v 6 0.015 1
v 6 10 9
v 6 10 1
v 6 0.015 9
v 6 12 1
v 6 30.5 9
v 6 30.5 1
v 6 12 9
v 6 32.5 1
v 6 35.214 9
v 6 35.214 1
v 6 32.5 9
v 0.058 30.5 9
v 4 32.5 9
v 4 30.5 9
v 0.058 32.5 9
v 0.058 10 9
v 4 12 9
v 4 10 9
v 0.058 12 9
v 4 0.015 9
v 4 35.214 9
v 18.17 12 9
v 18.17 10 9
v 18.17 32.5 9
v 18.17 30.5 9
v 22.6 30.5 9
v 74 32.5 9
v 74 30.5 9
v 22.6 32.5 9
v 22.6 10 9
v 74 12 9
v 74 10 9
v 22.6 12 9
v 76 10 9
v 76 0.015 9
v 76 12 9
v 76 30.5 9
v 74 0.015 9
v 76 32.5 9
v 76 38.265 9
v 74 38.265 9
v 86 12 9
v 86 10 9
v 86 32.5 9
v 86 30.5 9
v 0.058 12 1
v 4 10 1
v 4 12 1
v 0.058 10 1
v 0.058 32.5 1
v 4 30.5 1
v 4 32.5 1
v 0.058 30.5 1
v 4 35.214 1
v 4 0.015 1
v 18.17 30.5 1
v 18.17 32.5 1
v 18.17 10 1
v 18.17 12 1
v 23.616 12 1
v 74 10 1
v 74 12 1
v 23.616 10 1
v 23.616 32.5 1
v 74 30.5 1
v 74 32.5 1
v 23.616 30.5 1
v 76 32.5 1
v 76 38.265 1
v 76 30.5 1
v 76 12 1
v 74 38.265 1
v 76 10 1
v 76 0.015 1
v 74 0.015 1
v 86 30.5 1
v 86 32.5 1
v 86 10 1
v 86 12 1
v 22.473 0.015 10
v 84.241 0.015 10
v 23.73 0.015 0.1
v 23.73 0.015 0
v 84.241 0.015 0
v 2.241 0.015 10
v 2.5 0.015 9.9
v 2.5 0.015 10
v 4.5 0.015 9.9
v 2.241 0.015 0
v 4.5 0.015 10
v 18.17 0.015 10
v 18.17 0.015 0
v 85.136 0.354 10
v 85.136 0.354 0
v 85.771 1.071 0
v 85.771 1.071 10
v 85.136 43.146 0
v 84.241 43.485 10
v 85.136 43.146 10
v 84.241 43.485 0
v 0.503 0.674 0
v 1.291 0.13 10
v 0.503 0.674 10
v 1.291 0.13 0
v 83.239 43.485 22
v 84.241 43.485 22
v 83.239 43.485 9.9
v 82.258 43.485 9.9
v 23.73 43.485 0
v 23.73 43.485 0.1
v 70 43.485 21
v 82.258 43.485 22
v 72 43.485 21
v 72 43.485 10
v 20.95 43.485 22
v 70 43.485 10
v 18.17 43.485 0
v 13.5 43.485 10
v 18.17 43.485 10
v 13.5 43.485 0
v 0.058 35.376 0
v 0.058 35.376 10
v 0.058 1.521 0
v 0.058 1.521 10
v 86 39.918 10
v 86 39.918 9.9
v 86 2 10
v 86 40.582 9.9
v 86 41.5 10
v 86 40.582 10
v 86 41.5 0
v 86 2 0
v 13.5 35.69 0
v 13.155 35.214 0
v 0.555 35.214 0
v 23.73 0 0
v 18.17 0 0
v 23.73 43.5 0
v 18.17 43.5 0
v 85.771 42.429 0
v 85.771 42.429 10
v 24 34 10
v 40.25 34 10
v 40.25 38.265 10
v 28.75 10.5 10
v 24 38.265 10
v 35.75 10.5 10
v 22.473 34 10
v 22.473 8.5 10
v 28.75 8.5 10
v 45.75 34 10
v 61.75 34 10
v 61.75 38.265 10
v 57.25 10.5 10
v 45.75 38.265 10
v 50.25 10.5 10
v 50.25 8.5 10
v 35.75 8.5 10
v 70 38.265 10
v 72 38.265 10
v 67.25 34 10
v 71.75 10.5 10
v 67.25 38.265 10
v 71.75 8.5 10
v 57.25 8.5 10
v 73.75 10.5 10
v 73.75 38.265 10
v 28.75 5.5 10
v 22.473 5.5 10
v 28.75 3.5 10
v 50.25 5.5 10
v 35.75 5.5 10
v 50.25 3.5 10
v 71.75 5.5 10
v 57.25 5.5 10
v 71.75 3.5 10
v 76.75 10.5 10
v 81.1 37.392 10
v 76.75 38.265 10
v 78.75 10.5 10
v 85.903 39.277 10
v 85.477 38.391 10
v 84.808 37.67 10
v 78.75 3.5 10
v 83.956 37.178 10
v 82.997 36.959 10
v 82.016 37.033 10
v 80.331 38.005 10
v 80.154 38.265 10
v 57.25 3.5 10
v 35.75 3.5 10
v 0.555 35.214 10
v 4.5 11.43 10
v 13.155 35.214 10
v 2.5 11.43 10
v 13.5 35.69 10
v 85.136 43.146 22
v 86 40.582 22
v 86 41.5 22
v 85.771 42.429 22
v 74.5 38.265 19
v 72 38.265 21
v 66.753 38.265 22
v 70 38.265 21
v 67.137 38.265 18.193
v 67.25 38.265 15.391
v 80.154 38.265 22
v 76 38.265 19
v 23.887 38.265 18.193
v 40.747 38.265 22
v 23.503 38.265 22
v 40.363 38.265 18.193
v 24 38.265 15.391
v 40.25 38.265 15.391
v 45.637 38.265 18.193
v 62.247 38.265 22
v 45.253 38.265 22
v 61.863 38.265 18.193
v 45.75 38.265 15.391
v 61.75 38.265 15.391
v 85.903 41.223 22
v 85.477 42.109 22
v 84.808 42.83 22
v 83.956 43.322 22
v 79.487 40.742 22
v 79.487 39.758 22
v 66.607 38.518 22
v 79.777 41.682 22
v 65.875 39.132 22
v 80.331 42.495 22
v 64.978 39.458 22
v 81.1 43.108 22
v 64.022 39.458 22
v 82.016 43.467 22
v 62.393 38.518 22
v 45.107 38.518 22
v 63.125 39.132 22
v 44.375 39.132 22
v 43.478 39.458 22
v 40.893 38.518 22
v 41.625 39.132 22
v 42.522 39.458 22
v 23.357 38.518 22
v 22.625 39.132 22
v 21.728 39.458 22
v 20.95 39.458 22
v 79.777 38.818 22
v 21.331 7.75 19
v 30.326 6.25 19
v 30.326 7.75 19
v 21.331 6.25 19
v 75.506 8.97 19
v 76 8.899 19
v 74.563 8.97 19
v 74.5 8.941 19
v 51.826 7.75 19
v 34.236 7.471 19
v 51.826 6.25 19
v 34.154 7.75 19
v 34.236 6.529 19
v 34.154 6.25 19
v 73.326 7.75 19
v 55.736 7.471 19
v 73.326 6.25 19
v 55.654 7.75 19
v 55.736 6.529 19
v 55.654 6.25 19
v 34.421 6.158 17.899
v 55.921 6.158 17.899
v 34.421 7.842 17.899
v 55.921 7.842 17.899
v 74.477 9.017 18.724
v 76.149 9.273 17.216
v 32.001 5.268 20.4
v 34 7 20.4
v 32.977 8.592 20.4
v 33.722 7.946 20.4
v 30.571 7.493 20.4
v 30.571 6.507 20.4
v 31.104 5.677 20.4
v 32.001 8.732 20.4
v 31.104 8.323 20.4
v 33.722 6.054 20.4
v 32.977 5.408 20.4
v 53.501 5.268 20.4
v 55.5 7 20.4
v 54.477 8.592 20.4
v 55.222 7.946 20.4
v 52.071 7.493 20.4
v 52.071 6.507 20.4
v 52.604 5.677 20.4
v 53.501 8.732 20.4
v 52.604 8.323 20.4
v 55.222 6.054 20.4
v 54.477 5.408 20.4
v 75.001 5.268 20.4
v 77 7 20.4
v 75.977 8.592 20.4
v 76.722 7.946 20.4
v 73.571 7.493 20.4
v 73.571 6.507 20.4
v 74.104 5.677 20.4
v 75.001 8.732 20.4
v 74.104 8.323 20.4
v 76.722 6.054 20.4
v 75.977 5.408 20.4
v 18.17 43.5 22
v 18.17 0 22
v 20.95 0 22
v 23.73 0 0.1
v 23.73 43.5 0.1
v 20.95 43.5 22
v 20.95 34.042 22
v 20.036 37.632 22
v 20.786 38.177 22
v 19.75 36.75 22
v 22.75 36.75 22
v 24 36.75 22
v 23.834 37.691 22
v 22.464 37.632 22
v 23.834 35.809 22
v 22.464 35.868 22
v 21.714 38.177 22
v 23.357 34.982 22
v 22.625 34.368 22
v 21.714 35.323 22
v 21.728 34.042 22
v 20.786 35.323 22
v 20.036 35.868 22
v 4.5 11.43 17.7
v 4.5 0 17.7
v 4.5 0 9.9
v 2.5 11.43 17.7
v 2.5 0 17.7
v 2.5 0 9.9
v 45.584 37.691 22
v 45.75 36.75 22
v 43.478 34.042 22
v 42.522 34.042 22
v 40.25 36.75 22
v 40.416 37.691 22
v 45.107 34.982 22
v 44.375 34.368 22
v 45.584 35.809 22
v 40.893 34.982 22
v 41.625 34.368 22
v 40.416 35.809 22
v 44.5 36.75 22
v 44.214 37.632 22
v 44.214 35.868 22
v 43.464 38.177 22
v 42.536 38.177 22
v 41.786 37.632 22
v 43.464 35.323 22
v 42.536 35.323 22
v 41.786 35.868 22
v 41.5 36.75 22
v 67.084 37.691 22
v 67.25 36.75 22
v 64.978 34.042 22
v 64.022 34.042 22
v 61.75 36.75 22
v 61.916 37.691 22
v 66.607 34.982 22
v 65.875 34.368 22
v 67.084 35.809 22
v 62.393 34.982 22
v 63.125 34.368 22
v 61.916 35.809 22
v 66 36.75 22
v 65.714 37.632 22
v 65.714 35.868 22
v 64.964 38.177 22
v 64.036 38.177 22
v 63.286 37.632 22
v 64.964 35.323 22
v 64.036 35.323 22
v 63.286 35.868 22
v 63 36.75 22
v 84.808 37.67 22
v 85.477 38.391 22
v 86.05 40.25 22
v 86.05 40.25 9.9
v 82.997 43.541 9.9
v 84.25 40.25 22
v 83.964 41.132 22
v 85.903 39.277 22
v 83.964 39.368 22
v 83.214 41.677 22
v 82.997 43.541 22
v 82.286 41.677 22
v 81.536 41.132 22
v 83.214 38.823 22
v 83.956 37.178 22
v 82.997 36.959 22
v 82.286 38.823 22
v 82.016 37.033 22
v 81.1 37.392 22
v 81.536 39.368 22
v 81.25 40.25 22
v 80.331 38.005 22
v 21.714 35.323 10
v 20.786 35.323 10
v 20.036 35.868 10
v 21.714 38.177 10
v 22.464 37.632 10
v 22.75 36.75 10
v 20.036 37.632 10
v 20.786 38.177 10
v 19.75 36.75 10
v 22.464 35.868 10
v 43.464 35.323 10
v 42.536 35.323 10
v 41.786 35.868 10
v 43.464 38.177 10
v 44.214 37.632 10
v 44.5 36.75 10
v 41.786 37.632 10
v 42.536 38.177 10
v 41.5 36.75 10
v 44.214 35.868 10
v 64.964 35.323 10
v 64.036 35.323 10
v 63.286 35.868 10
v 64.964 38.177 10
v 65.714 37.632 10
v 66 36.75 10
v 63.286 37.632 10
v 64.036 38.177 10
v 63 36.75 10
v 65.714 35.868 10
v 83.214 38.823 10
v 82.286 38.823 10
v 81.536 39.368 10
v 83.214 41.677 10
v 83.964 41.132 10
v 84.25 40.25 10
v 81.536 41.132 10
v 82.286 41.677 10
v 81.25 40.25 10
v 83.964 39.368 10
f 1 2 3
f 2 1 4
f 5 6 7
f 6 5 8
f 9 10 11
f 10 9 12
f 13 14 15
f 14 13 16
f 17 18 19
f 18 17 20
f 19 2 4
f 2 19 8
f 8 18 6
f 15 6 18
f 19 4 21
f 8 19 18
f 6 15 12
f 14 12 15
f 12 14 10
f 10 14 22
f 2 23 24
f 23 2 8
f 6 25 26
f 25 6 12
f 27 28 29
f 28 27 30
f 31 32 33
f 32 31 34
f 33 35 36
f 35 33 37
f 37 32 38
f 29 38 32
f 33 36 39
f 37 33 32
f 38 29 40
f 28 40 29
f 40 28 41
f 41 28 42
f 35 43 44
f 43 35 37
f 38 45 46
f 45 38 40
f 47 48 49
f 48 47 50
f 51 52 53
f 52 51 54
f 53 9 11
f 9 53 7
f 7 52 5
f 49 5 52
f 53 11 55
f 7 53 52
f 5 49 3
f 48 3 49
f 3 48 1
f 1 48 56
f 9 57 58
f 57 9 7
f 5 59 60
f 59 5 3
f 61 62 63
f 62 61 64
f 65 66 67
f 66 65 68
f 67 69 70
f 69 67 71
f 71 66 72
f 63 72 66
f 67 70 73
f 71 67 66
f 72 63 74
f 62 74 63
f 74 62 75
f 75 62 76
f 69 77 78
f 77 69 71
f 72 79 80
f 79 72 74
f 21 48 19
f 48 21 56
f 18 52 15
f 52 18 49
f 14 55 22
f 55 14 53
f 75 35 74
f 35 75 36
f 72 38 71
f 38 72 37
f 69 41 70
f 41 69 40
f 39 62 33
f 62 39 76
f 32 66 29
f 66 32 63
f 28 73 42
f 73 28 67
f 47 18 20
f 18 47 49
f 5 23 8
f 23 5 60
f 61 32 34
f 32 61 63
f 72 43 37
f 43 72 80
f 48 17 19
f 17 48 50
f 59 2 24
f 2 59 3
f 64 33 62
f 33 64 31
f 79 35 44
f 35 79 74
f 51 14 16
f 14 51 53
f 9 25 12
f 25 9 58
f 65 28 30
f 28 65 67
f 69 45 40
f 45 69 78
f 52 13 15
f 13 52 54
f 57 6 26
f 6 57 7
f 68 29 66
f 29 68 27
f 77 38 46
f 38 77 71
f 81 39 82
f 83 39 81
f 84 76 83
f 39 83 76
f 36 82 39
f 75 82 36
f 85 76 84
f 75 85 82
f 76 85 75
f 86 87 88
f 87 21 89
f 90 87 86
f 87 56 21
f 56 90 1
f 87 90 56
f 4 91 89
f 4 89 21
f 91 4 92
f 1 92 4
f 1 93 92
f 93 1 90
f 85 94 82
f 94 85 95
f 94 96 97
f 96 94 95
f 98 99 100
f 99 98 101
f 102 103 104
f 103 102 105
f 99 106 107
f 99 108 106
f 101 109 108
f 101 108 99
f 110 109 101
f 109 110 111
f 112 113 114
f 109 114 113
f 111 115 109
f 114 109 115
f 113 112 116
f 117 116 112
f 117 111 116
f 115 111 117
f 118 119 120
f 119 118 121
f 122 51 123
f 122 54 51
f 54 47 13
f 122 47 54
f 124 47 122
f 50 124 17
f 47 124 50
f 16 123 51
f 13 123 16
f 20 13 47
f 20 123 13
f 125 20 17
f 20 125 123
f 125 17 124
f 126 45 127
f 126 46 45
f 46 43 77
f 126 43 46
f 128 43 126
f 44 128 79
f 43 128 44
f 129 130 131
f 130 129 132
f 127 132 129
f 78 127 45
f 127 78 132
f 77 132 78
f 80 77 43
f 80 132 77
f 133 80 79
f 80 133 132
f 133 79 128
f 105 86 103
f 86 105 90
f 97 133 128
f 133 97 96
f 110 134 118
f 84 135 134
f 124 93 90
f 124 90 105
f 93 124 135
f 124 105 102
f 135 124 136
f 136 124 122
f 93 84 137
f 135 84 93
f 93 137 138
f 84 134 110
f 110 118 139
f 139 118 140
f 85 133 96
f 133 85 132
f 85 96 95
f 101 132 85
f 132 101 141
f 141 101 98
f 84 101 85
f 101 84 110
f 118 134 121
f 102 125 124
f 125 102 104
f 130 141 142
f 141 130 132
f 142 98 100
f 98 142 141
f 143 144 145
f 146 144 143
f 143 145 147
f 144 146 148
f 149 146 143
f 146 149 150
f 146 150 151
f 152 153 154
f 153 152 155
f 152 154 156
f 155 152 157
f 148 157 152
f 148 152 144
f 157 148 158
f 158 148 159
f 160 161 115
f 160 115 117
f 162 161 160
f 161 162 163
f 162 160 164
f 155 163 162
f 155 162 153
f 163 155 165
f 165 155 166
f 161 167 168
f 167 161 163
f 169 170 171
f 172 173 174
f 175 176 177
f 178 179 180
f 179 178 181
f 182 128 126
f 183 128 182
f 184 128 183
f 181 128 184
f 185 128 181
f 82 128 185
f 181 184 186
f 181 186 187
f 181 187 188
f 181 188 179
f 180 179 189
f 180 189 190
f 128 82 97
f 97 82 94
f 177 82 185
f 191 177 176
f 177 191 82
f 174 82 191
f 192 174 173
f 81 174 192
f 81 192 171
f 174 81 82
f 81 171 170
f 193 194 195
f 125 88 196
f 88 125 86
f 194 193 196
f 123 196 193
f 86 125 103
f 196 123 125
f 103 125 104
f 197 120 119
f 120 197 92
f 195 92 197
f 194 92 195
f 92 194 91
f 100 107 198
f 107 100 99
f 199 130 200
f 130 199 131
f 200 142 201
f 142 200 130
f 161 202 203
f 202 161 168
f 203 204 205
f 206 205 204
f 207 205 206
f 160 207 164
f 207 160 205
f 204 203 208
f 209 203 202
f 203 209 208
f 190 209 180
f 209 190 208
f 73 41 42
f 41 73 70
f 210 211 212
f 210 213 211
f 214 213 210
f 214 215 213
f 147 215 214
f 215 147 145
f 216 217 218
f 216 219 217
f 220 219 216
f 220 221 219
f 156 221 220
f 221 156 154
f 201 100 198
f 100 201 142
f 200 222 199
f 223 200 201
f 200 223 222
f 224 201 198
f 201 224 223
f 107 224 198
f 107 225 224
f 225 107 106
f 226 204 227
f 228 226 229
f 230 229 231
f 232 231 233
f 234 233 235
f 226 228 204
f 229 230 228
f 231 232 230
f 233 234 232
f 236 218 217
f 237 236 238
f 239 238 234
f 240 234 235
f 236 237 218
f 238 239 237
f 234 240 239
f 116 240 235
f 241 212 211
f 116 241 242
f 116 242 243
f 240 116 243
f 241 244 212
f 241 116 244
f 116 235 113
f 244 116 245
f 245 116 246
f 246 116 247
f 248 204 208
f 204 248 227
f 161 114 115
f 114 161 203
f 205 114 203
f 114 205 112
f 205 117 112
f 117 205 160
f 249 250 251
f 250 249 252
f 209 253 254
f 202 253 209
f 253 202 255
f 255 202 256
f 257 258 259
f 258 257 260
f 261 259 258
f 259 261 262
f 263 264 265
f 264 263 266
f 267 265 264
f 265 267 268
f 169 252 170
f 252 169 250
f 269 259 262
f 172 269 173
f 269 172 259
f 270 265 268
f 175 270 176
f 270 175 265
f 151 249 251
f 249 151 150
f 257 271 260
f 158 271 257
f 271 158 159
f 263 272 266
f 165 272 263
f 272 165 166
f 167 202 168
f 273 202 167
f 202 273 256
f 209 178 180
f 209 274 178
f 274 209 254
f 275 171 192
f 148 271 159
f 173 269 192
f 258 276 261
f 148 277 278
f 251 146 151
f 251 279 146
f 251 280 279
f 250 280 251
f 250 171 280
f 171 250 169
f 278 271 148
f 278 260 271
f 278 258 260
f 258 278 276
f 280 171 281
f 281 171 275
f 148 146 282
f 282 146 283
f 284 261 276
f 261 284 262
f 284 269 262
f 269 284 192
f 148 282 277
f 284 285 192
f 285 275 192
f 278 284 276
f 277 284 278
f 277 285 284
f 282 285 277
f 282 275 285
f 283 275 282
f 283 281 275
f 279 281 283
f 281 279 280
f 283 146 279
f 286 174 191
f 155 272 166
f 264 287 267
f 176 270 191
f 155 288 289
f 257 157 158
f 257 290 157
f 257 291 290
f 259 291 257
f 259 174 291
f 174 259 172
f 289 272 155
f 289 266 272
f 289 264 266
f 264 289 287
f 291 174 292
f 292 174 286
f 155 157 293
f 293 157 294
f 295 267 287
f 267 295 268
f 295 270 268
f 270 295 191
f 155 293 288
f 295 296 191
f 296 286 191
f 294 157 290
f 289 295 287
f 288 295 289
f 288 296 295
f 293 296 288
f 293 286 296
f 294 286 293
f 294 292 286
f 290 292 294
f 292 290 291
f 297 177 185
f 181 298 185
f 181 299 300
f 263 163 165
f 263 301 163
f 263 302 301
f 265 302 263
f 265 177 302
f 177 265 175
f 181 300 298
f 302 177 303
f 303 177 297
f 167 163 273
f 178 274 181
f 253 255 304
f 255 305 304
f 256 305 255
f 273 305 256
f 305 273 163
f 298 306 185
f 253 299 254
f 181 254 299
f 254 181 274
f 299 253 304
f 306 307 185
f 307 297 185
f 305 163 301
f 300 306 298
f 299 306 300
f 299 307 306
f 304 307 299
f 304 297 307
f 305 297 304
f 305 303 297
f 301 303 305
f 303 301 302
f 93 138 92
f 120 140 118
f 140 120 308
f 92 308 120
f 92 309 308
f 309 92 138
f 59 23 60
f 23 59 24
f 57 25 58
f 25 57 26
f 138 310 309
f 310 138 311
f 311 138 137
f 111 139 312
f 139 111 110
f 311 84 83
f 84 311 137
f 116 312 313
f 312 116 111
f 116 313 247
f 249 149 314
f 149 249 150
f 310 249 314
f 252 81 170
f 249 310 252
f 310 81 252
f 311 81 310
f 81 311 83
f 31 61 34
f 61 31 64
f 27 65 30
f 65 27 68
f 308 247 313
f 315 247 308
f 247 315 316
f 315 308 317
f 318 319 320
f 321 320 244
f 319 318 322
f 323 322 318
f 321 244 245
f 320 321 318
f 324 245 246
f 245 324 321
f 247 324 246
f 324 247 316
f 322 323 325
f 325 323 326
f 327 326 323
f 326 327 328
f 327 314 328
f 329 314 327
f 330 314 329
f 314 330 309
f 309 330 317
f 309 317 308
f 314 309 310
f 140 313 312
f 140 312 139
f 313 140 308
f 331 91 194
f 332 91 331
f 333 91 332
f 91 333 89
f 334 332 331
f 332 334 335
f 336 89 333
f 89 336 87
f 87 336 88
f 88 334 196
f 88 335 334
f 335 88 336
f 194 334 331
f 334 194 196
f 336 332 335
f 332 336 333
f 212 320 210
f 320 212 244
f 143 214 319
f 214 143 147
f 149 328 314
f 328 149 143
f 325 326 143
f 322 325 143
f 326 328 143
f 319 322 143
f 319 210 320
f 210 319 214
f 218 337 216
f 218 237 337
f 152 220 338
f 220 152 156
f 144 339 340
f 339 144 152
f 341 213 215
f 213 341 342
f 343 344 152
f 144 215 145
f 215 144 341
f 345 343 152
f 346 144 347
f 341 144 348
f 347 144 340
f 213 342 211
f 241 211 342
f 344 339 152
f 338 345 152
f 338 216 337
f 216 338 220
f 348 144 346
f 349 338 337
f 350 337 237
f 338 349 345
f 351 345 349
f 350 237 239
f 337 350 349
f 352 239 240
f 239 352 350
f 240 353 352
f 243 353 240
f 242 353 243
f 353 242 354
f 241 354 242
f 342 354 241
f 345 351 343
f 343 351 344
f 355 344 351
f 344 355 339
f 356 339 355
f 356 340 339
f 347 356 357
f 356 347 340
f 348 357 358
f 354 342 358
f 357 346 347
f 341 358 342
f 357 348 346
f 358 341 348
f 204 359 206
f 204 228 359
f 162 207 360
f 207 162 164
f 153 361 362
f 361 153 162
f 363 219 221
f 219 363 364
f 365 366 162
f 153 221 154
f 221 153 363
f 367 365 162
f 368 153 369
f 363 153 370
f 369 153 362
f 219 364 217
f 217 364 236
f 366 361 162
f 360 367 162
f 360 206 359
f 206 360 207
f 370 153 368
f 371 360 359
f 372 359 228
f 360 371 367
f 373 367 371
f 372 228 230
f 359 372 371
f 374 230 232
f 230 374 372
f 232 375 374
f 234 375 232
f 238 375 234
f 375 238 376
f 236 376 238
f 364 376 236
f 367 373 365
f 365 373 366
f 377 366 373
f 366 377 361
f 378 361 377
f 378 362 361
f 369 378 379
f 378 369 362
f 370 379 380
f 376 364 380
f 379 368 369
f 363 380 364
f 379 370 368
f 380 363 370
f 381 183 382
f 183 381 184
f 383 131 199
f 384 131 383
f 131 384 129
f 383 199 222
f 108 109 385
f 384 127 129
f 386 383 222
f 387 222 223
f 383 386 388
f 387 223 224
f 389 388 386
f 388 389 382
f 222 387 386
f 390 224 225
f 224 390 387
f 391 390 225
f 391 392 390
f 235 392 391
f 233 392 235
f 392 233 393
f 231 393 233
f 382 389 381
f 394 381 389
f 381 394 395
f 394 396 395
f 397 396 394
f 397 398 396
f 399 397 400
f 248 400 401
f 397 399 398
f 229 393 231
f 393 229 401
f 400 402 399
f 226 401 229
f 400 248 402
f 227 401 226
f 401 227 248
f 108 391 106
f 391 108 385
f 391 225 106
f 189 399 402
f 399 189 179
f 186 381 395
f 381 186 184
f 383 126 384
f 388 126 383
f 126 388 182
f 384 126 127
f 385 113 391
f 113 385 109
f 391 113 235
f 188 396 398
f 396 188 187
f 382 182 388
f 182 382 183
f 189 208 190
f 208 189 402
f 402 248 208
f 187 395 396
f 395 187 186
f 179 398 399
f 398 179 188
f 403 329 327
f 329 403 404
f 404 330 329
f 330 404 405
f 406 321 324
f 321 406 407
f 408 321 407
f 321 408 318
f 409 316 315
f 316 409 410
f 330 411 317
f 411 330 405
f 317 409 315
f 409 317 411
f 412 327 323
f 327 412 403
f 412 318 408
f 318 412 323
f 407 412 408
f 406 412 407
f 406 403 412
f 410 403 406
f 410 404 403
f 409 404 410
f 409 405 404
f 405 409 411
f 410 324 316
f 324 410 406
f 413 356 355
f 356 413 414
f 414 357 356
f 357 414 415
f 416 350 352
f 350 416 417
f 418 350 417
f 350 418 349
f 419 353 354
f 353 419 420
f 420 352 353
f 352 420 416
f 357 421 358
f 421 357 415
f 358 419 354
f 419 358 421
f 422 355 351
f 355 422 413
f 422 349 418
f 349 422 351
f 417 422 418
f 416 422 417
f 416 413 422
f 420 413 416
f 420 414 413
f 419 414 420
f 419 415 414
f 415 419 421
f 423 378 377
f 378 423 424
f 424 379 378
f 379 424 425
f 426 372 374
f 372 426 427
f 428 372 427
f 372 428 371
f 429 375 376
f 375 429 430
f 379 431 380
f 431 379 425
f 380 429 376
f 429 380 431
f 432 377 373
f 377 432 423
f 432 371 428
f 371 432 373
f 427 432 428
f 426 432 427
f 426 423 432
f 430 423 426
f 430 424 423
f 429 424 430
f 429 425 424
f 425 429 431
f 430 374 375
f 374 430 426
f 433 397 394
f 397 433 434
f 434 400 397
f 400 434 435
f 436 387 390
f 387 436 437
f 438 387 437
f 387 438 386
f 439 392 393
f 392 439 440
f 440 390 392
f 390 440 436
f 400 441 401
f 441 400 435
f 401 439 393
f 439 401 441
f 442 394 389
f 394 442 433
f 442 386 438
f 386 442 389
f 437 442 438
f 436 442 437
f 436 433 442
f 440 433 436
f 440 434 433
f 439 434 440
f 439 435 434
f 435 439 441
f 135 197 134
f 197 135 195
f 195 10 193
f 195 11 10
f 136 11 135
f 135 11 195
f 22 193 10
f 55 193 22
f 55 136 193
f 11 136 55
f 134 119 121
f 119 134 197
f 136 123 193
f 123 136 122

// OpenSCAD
hq = true;
clr = 0.2;

$fs = hq ? 1 : 4;
$fa = hq ? 1 : 4;
eps = 0.1;

// Constants from the Eagle file

// Board dimensions
board_x = 0;
board_y = 0;
board_w = 86;
board_h = 43.5;
board_r = 2;

// Teensy location
teensy_cx =  9.08;
teensy_cy = 19.05;
teensy_w =  7 * 2.54;
teensy_h = 14 * 2.54;
teensy_paddle_w = 20.75;

// Tactile switches
sw1_x = 32.25;
sw1_y = 7;
sw2_x = 53.75;
sw2_y = 7;
sw3_x = 75.25;
sw3_y = 7;
swlast_x = sw3_x;
sw_d = 2.5;

// Screw holes
hole1_x = 21.25;
hole1_y = 36.75;

hole2_x = 43;
hole2_y = 36.75;

hole3_x = 64.5;
hole3_y = 36.75;

hole4_x = 82.75;
hole4_y = 40.25;

hole_d = 3;
hole_clr = 0;

// Paddles
paddle_y = 3.5;

// Spine
spine_y = 38.25;
spine_cx2 = (37.25 + 48.5) / 2;
spine_cx3 = (58.75 + 66.72) / 2;

// Header
header_cx = 7.79;
header_cy = 39.73;
header_w = 3 * 2.54;
header_h = 2 * 2.54;

// End Eagle constants

teensy_rx = teensy_cx + teensy_w / 2; // Teensy right side x coord.

// Z heights
base_z = 1 + 7 + 2;
deck_z = base_z + 9 + 3;
sw_z = deck_z - 1.6;
teensy_z = deck_z - 4.1;
bulkhead_z = deck_z - 3;

module centered_cube(size, zt=0) {
    translate([-size[0] / 2, -size[1] / 2, zt])
        cube(size);
}

module round_rect(size, r) {
    hull()
        for (x = [r, size[0] - r]) for ( y = [r, size[1] - r]) {
            translate([x, y, 0])
                cylinder(r=r, h=size[2]);
        }
}


module base() {
    difference() {
        round_rect([board_w, board_h, base_z], board_r);
        for (x = [4, 20, board_w - 12])
            translate([x, -eps, 1])
                cube([2, board_h + 2 * eps, base_z - 2]);
        for (y = [10, board_h - 13])
            translate([-eps, y, 1])
                cube([board_w + 2 * eps, 2, base_z - 2]);
    }
}

module spine() {
    lx = teensy_rx + clr;
    difference() {
        translate([lx, spine_y, eps])
            round_rect([board_w - lx, board_h - spine_y, deck_z - eps],
                       r=board_r);
        // strain relief
        translate([board_w - 16, spine_y - eps, base_z])
            cube([2, board_h, deck_z - base_z - 1]);
    }
}

module bulkheads() {
    bt0 = 3;
    bt1 = 1.5;
    bx = teensy_rx + clr;
    by = sw1_y;
    bw = swlast_x - bx;
    bh = board_h - by;
    translate([bx + eps, by, 0])
        hull() {
            translate([0, -bt0/2, base_z - eps])
                cube([bw + bt0/2, bt0, eps]);
            translate([0, -bt1/2, bulkhead_z - eps])
                cube([bw + bt1/2, bt1, eps]);
        }
    translate([bx + bw, board_h, 0])
        rotate(-90)
            hull() {
                translate([eps, -bt0/2, base_z - eps])
                    cube([bh + bt0/2 - eps, bt0, eps]);
                translate([eps, -bt1/2, bulkhead_z - eps])
                    cube([bh + bt1/2 - eps, bt1, eps]);
            }
}

module screw_support(x, y, z) {
    support_d = hole_d + 2.5;
    hull() {
        translate([x, y, base_z - eps])
            centered_cube([support_d, support_d, eps]);
        translate([x, y, z - eps])
            cylinder(d=support_d, h = eps);
    }
}

module end_screw_support(x, y ,z) {
    support_d = 6.6;
    translate([x, y, base_z - eps])
        cylinder(d = support_d, h = z - base_z + eps);
}

module screw_supports() {
    screw_support(hole1_x, hole1_y, deck_z);
    screw_support(hole2_x, hole2_y, deck_z);
    screw_support(hole3_x, hole3_y, deck_z);
    end_screw_support(hole4_x, hole4_y, deck_z);
}

module screw_hole(x, y, z) {
    translate([x, y, z])
        cylinder(d=hole_d + hole_clr, h=deck_z + 3);
}

module screw_holes() {
    screw_hole(hole1_x, hole1_y, base_z);
    screw_hole(hole2_x, hole2_y, base_z);
    screw_hole(hole3_x, hole3_y, base_z);
    screw_hole(hole4_x, hole4_y, base_z);
}

module switch_pillars() {
    module switch_pillar(x, y) {
        mbh = 2 * (y - paddle_y);
        mbw = mbh;
        translate([x, y, 0])
            hull() {
                centered_cube([mbw, mbh, eps], zt=base_z - eps);
                translate([0, 0, sw_z - eps])
                    cylinder(d=sw_d + 1, h=eps);
            }
    }
    switch_pillar(sw1_x, sw1_y);
    switch_pillar(sw2_x, sw2_y);
    switch_pillar(sw3_x, sw3_y);
}

module under_teensy() {
    uw = teensy_paddle_w - teensy_rx;
    translate([teensy_rx + clr, 0, 0])
        hull() {
            cube([2 * uw, board_h, eps]);
            translate([0, 0, deck_z - eps])
                cube([uw, board_h, eps]);
        }
    translate([2.5, 0, base_z - eps])
        cube([2, 4.5 * 2.54, teensy_z - base_z - eps]);
}

module header_cutout() {
    hdr_clr = 2;
    translate([-eps, header_cy - header_h / 2 - hdr_clr, -eps])
        round_rect([header_cx + header_w / 2 + hdr_clr,
                    board_h,
                    deck_z + 2 * eps],
                   r=0.5);
}

module substrate() {
    difference() {
        union() {
            base();
            spine();
            bulkheads();
            switch_pillars();
            under_teensy();
            screw_supports();
        };
        screw_holes();
        header_cutout();
    };
}

substrate();
